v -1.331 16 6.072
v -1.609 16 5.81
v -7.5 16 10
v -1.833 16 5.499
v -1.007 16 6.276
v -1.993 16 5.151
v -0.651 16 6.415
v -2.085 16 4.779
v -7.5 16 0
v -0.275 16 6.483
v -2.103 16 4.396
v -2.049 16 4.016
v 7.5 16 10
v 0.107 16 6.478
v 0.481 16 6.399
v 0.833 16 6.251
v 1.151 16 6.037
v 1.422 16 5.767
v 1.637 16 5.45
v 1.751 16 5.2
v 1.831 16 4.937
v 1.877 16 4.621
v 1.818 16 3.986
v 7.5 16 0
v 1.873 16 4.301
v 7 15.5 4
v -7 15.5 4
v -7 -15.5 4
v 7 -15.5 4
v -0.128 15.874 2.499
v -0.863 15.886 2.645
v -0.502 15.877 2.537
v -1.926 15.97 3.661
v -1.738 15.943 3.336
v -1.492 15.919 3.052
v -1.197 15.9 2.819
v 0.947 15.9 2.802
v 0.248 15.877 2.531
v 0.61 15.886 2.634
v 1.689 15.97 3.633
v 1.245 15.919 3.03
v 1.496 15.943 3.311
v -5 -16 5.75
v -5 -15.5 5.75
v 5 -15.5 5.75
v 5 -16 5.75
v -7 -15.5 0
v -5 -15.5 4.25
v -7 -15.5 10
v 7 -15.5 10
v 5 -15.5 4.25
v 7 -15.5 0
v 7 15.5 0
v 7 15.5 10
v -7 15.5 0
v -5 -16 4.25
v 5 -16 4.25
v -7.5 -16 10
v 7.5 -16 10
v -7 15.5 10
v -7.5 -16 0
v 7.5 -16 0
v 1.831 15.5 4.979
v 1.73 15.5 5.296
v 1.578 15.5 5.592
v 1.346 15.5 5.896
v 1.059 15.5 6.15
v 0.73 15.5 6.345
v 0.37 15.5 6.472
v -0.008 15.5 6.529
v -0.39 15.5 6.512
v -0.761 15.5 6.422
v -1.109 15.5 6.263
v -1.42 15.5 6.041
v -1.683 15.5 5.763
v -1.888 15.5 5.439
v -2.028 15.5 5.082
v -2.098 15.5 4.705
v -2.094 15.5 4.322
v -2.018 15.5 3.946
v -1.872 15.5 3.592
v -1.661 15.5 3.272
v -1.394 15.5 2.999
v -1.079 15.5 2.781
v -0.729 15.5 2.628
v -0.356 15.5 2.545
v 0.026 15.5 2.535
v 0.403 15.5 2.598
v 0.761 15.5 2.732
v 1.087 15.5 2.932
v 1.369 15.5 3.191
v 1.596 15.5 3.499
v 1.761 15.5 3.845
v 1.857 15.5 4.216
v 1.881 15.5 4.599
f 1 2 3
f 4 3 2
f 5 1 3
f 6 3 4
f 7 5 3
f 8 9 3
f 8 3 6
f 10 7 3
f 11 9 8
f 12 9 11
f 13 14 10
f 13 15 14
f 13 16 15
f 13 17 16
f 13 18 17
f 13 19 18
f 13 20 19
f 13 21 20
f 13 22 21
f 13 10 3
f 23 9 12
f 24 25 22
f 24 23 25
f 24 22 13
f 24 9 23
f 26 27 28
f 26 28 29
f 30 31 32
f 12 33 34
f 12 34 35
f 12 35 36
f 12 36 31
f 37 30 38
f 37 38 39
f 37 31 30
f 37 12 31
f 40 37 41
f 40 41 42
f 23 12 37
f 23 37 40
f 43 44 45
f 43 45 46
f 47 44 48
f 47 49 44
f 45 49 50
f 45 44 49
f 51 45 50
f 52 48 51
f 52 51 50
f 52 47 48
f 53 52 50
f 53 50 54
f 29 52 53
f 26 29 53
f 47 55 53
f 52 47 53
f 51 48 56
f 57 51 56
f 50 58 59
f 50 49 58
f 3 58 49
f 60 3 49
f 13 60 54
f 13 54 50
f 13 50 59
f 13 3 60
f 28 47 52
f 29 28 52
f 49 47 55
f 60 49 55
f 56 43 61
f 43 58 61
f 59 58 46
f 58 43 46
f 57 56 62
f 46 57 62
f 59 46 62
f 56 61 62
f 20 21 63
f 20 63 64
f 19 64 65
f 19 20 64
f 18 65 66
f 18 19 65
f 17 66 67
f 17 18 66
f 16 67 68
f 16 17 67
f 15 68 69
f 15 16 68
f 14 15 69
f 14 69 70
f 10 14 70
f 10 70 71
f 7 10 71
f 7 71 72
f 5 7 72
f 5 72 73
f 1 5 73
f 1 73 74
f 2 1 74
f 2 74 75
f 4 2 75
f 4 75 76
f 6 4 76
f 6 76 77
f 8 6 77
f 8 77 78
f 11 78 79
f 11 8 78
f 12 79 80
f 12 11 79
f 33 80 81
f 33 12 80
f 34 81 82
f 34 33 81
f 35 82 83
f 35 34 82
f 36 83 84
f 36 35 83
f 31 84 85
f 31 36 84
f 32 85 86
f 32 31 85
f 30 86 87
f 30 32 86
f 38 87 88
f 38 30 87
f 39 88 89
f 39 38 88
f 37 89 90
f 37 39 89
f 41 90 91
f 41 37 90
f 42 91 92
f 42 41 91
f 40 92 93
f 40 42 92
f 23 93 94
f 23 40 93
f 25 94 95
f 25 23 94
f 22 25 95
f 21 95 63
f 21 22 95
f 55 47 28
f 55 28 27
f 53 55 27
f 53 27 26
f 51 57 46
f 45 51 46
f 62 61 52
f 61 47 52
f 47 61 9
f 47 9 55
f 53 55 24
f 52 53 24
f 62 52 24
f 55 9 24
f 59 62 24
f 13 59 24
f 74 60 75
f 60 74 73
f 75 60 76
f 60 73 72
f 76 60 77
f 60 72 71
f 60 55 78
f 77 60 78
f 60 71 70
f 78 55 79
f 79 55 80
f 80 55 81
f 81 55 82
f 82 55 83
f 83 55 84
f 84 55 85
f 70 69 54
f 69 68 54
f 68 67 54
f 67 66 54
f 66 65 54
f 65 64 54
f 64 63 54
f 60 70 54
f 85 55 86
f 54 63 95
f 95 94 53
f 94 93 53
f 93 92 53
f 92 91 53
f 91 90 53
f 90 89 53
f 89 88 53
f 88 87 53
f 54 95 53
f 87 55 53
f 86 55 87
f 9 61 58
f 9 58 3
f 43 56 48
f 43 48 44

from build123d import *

# Parameters (mm, degrees)
SKETCH001_W             = 14
SKETCH001_H             = 31
PAD001_DEPTH            = 4
SKETCH003_R             = 1.993663
PAD005_DEPTH            = 1
BODY003_ROLL_ANGLE      = 85.080334
BODY003_PITCH_ANGLE     = -12.894288
BODY003_PLACEMENT_ANGLE = 1.138227
SKETCH002_W             = 1.5
SKETCH002_H             = 4
PAD004_DEPTH            = 10
BODY002_PITCH_ANGLE     = -90
BODY002_PLACEMENT_ANGLE = -180
SKETCH_W                = 15
SKETCH_H                = 32
SKETCH_W_2              = 14
SKETCH_H_2              = 31
PAD_DEPTH               = 10


with BuildPart() as body001:
    # Sketch001 → Pad001 (new body)
    with BuildSketch(Plane.XY):
        Rectangle(SKETCH001_W, SKETCH001_H)
    extrude(amount=PAD001_DEPTH)


with BuildPart() as body003:
    # Sketch003 → Pad005 (new body)
    with BuildSketch(Plane.XY):
        with Locations((0, 0.5)):
            Circle(SKETCH003_R)
    extrude(amount=PAD005_DEPTH)


with BuildPart() as body003_1:
    # Body003 roll: moved
    add(body003.part.rotate(Axis((0, 0, 0), (1, 0, 0)), BODY003_ROLL_ANGLE))


with BuildPart() as body003_2:
    # Body003 pitch: moved
    add(body003_1.part.rotate(Axis((0, 0, 0), (0, 1, 0)), BODY003_PITCH_ANGLE))


with BuildPart() as body003_3:
    # Body003 placement: moved
    add(body003_2.part.moved(Location((0, 16, 4))).rotate(Axis((0, 16, 4), (0, 0, 1)), BODY003_PLACEMENT_ANGLE))


with BuildPart() as body002:
    # Sketch002 → Pad004 (new body)
    with BuildSketch(Plane.XY):
        Rectangle(SKETCH002_W, SKETCH002_H)
    extrude(amount=PAD004_DEPTH)


with BuildPart() as body002_1:
    # Body002 pitch: moved
    add(body002.part.rotate(Axis((0, 0, 0), (0, 1, 0)), BODY002_PITCH_ANGLE))


with BuildPart() as body002_2:
    # Body002 placement: moved
    add(body002_1.part.moved(Location((-5, -14, 5))).rotate(Axis((-5, -14, 5), (0, 0, 1)), BODY002_PLACEMENT_ANGLE))


with BuildPart() as cut001:
    # Sketch → Pad (new body)
    with BuildSketch(Plane.XY):
        Rectangle(SKETCH_W, SKETCH_H)
        Rectangle(SKETCH_W_2, SKETCH_H_2, mode=Mode.SUBTRACT)
    extrude(amount=PAD_DEPTH)

    # Cut: cut Body002
    add(body002_2.part, mode=Mode.SUBTRACT)

    # Cut001: cut Body003
    add(body003_3.part, mode=Mode.SUBTRACT)


solid = Compound([body001.part, cut001.part])
